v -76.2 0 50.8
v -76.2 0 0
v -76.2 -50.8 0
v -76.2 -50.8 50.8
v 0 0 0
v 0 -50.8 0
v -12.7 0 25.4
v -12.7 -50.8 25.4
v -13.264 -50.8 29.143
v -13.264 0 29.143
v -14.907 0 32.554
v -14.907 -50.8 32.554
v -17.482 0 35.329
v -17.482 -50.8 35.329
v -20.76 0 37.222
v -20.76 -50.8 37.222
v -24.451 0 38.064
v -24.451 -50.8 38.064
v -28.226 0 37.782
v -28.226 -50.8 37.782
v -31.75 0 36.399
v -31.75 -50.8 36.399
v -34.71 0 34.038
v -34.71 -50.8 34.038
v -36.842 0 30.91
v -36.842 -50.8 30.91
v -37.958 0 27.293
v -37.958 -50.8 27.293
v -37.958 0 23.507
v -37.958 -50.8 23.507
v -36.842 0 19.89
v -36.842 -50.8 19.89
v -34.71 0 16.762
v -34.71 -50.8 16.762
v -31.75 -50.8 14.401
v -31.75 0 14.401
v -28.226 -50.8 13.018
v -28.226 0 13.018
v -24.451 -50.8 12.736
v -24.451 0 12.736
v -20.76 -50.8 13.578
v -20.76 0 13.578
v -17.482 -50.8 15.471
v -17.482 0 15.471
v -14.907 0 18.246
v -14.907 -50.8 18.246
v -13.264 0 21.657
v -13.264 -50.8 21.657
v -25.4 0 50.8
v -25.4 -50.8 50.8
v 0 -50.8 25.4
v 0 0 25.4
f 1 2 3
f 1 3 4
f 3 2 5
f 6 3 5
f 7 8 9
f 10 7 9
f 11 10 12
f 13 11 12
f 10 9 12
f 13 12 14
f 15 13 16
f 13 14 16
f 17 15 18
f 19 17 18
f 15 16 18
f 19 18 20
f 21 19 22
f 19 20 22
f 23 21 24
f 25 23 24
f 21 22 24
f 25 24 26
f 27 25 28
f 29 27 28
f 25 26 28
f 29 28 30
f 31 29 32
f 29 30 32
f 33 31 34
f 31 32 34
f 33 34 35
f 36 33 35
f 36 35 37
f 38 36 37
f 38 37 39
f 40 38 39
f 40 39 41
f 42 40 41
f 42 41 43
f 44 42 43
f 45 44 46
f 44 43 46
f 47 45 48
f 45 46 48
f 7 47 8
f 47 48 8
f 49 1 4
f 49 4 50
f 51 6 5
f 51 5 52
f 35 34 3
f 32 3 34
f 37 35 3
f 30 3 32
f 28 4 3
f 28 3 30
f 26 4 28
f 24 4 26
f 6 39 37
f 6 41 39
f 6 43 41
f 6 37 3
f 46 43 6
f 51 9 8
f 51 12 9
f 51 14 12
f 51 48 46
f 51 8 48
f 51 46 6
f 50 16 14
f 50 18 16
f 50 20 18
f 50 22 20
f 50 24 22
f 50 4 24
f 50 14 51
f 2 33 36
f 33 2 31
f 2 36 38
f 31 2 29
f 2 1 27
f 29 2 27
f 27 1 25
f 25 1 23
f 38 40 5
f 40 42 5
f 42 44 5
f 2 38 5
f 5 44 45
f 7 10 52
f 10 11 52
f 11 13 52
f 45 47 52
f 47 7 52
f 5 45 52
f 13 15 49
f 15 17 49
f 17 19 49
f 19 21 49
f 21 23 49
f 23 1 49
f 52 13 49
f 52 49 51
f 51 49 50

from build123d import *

# Parameters (mm, degrees)
F0_W     = 76.2
F0_H     = 50.8
F1_DEPTH = 50.8
F2_SIZE  = 25.4
F3_R     = 12.7
F4_DEPTH = 50.8


with BuildPart() as f1:
    # F0 (on Front) → F1 (new body)
    with BuildSketch(Plane.XZ):
        with Locations((-38.1, 25.4)):
            Rectangle(F0_W, F0_H)
    extrude(amount=F1_DEPTH)

    # F2
    f2_edges = [f1.edges().sort_by_distance(p)[0] for p in [
        (0, -25.4, 50.8),
    ]]
    chamfer(f2_edges, length=F2_SIZE)

    # F3 (on face) → F4 (cut)
    with BuildSketch(Plane.XZ.offset(50.8)):
        with Locations((-25.4, 25.4)):
            Circle(F3_R)
    extrude(amount=-F4_DEPTH, mode=Mode.SUBTRACT)


solid = f1.part
